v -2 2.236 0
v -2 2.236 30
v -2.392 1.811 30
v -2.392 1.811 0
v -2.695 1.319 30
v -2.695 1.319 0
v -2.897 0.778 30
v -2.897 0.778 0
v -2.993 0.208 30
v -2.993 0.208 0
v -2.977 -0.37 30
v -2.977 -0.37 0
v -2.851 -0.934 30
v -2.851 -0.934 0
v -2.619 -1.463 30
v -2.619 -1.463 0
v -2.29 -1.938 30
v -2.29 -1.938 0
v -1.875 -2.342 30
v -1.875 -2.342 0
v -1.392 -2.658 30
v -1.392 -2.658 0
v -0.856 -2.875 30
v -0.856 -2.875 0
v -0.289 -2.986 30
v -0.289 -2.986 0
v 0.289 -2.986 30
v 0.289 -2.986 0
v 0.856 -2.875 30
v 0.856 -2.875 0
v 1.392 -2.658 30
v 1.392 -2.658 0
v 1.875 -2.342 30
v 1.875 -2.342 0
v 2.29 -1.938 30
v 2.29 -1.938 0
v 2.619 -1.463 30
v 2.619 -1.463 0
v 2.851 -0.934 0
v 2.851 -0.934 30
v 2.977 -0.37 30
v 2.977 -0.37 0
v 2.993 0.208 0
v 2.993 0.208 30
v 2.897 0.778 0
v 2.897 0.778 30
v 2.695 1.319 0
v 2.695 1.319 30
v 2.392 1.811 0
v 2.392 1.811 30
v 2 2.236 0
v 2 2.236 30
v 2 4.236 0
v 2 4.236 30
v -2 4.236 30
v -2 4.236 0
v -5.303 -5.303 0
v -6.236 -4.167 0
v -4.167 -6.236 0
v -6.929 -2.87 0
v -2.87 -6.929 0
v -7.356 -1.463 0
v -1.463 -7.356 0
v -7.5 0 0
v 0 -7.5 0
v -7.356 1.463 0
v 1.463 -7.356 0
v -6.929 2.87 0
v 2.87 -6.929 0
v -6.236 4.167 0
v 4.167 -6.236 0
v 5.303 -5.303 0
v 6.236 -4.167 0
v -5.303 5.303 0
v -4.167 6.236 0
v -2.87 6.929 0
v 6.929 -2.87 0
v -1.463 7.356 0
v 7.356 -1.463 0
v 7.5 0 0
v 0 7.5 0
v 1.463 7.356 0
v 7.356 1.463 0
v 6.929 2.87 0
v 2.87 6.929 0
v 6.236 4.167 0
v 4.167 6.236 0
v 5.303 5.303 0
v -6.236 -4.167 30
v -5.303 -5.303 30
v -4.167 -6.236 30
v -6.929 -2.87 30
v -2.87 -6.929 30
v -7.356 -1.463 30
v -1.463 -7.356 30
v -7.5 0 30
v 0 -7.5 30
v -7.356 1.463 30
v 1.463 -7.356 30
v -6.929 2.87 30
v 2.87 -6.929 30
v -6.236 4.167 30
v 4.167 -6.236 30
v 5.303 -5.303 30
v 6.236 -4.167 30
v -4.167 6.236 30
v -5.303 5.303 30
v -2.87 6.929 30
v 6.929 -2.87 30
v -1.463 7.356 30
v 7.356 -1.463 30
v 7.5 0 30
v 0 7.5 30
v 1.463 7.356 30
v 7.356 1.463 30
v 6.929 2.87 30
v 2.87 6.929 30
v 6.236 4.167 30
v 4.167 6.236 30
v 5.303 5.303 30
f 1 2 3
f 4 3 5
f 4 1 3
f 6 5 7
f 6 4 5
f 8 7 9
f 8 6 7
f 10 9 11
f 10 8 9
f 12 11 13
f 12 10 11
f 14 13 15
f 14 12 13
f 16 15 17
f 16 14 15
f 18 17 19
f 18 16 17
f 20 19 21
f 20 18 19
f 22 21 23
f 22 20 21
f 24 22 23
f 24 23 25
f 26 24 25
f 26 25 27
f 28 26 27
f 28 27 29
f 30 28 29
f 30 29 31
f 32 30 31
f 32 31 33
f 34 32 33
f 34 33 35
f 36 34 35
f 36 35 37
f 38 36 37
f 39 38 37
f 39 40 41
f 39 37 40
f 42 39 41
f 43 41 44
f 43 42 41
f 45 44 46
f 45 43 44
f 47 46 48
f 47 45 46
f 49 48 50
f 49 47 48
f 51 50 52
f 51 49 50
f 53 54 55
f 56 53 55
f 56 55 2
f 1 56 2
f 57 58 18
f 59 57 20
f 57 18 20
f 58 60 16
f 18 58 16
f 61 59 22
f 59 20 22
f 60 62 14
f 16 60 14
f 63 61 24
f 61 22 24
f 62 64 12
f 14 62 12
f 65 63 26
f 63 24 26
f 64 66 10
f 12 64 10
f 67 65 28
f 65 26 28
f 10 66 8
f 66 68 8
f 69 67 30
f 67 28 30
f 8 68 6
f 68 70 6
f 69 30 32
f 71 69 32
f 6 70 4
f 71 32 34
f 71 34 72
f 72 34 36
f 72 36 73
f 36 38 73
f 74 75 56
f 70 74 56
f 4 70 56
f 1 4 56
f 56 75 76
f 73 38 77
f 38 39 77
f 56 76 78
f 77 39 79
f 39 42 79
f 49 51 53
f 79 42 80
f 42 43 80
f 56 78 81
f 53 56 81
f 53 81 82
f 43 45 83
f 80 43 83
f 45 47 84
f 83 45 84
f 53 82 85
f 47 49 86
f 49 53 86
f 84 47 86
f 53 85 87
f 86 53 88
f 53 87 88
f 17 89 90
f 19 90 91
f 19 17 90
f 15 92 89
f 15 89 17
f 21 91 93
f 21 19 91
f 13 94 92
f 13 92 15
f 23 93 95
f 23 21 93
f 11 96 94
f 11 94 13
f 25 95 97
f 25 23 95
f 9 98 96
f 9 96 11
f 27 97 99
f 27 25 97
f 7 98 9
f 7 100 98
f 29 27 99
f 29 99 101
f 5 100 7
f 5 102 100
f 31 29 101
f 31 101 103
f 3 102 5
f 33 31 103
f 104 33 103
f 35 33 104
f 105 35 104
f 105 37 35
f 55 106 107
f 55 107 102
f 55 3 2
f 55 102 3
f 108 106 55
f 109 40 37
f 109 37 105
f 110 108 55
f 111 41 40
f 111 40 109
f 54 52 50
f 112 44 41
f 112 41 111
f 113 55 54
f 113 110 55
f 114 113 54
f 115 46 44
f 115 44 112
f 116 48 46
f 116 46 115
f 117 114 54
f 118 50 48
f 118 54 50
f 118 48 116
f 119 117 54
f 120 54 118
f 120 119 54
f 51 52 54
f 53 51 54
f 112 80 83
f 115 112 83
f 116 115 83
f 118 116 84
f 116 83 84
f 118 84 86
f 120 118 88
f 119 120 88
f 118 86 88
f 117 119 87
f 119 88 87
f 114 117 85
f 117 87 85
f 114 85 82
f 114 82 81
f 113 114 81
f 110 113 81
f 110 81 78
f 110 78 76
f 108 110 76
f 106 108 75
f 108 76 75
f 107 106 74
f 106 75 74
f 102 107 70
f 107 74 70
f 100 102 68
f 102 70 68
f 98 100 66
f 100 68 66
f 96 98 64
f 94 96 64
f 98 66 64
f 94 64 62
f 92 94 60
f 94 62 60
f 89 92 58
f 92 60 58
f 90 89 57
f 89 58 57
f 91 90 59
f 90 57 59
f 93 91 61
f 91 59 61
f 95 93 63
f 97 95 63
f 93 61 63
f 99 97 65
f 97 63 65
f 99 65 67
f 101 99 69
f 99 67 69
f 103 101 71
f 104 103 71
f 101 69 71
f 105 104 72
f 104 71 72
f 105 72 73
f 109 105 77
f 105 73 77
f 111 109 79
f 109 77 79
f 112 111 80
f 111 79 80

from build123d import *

# Parameters (mm, degrees)
SKETCH1_R           = 7.5
SKETCH1_R_2         = 3
BOSS_EXTRUDE1_DEPTH = 30
CUT_EXTRUDE1_DEPTH  = 32.819805153


with BuildPart() as part:
    # Sketch1 → Boss-Extrude1 (new body)
    with BuildSketch(Plane.XY):
        Circle(SKETCH1_R)
        Circle(SKETCH1_R_2, mode=Mode.SUBTRACT)
    extrude(amount=BOSS_EXTRUDE1_DEPTH)

    # Sketch2 → Cut-Extrude1 (cut, through all)
    with BuildSketch(Plane.XY.offset(30)):
        with BuildLine():
            ThreePointArc((-2, 2.236067977), (-1.070466269, 2.802517077), (0, 3))
            Line((0, 3), (0, 4.236067977))
            Line((0, 4.236067977), (-2, 4.236067977))
            Line((-2, 4.236067977), (-2, 2.236067977))
        make_face()
        with BuildLine():
            Line((0, 4.236067977), (0, 3))
            ThreePointArc((0, 3), (1.070466269, 2.802517077), (2, 2.236067977))
            Line((2, 2.236067977), (2, 4.236067977))
            Line((2, 4.236067977), (0, 4.236067977))
        make_face()
    extrude(amount=-CUT_EXTRUDE1_DEPTH, mode=Mode.SUBTRACT)


solid = part.part
